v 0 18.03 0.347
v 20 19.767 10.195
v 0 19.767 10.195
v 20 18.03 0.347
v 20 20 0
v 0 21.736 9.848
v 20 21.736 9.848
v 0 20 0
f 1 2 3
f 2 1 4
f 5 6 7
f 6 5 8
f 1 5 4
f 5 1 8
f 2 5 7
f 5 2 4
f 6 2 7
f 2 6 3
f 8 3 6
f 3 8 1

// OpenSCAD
translate([0,20,0]){
    rotate([80,0,0]){
        cube([20,10,2]);
    }
}
